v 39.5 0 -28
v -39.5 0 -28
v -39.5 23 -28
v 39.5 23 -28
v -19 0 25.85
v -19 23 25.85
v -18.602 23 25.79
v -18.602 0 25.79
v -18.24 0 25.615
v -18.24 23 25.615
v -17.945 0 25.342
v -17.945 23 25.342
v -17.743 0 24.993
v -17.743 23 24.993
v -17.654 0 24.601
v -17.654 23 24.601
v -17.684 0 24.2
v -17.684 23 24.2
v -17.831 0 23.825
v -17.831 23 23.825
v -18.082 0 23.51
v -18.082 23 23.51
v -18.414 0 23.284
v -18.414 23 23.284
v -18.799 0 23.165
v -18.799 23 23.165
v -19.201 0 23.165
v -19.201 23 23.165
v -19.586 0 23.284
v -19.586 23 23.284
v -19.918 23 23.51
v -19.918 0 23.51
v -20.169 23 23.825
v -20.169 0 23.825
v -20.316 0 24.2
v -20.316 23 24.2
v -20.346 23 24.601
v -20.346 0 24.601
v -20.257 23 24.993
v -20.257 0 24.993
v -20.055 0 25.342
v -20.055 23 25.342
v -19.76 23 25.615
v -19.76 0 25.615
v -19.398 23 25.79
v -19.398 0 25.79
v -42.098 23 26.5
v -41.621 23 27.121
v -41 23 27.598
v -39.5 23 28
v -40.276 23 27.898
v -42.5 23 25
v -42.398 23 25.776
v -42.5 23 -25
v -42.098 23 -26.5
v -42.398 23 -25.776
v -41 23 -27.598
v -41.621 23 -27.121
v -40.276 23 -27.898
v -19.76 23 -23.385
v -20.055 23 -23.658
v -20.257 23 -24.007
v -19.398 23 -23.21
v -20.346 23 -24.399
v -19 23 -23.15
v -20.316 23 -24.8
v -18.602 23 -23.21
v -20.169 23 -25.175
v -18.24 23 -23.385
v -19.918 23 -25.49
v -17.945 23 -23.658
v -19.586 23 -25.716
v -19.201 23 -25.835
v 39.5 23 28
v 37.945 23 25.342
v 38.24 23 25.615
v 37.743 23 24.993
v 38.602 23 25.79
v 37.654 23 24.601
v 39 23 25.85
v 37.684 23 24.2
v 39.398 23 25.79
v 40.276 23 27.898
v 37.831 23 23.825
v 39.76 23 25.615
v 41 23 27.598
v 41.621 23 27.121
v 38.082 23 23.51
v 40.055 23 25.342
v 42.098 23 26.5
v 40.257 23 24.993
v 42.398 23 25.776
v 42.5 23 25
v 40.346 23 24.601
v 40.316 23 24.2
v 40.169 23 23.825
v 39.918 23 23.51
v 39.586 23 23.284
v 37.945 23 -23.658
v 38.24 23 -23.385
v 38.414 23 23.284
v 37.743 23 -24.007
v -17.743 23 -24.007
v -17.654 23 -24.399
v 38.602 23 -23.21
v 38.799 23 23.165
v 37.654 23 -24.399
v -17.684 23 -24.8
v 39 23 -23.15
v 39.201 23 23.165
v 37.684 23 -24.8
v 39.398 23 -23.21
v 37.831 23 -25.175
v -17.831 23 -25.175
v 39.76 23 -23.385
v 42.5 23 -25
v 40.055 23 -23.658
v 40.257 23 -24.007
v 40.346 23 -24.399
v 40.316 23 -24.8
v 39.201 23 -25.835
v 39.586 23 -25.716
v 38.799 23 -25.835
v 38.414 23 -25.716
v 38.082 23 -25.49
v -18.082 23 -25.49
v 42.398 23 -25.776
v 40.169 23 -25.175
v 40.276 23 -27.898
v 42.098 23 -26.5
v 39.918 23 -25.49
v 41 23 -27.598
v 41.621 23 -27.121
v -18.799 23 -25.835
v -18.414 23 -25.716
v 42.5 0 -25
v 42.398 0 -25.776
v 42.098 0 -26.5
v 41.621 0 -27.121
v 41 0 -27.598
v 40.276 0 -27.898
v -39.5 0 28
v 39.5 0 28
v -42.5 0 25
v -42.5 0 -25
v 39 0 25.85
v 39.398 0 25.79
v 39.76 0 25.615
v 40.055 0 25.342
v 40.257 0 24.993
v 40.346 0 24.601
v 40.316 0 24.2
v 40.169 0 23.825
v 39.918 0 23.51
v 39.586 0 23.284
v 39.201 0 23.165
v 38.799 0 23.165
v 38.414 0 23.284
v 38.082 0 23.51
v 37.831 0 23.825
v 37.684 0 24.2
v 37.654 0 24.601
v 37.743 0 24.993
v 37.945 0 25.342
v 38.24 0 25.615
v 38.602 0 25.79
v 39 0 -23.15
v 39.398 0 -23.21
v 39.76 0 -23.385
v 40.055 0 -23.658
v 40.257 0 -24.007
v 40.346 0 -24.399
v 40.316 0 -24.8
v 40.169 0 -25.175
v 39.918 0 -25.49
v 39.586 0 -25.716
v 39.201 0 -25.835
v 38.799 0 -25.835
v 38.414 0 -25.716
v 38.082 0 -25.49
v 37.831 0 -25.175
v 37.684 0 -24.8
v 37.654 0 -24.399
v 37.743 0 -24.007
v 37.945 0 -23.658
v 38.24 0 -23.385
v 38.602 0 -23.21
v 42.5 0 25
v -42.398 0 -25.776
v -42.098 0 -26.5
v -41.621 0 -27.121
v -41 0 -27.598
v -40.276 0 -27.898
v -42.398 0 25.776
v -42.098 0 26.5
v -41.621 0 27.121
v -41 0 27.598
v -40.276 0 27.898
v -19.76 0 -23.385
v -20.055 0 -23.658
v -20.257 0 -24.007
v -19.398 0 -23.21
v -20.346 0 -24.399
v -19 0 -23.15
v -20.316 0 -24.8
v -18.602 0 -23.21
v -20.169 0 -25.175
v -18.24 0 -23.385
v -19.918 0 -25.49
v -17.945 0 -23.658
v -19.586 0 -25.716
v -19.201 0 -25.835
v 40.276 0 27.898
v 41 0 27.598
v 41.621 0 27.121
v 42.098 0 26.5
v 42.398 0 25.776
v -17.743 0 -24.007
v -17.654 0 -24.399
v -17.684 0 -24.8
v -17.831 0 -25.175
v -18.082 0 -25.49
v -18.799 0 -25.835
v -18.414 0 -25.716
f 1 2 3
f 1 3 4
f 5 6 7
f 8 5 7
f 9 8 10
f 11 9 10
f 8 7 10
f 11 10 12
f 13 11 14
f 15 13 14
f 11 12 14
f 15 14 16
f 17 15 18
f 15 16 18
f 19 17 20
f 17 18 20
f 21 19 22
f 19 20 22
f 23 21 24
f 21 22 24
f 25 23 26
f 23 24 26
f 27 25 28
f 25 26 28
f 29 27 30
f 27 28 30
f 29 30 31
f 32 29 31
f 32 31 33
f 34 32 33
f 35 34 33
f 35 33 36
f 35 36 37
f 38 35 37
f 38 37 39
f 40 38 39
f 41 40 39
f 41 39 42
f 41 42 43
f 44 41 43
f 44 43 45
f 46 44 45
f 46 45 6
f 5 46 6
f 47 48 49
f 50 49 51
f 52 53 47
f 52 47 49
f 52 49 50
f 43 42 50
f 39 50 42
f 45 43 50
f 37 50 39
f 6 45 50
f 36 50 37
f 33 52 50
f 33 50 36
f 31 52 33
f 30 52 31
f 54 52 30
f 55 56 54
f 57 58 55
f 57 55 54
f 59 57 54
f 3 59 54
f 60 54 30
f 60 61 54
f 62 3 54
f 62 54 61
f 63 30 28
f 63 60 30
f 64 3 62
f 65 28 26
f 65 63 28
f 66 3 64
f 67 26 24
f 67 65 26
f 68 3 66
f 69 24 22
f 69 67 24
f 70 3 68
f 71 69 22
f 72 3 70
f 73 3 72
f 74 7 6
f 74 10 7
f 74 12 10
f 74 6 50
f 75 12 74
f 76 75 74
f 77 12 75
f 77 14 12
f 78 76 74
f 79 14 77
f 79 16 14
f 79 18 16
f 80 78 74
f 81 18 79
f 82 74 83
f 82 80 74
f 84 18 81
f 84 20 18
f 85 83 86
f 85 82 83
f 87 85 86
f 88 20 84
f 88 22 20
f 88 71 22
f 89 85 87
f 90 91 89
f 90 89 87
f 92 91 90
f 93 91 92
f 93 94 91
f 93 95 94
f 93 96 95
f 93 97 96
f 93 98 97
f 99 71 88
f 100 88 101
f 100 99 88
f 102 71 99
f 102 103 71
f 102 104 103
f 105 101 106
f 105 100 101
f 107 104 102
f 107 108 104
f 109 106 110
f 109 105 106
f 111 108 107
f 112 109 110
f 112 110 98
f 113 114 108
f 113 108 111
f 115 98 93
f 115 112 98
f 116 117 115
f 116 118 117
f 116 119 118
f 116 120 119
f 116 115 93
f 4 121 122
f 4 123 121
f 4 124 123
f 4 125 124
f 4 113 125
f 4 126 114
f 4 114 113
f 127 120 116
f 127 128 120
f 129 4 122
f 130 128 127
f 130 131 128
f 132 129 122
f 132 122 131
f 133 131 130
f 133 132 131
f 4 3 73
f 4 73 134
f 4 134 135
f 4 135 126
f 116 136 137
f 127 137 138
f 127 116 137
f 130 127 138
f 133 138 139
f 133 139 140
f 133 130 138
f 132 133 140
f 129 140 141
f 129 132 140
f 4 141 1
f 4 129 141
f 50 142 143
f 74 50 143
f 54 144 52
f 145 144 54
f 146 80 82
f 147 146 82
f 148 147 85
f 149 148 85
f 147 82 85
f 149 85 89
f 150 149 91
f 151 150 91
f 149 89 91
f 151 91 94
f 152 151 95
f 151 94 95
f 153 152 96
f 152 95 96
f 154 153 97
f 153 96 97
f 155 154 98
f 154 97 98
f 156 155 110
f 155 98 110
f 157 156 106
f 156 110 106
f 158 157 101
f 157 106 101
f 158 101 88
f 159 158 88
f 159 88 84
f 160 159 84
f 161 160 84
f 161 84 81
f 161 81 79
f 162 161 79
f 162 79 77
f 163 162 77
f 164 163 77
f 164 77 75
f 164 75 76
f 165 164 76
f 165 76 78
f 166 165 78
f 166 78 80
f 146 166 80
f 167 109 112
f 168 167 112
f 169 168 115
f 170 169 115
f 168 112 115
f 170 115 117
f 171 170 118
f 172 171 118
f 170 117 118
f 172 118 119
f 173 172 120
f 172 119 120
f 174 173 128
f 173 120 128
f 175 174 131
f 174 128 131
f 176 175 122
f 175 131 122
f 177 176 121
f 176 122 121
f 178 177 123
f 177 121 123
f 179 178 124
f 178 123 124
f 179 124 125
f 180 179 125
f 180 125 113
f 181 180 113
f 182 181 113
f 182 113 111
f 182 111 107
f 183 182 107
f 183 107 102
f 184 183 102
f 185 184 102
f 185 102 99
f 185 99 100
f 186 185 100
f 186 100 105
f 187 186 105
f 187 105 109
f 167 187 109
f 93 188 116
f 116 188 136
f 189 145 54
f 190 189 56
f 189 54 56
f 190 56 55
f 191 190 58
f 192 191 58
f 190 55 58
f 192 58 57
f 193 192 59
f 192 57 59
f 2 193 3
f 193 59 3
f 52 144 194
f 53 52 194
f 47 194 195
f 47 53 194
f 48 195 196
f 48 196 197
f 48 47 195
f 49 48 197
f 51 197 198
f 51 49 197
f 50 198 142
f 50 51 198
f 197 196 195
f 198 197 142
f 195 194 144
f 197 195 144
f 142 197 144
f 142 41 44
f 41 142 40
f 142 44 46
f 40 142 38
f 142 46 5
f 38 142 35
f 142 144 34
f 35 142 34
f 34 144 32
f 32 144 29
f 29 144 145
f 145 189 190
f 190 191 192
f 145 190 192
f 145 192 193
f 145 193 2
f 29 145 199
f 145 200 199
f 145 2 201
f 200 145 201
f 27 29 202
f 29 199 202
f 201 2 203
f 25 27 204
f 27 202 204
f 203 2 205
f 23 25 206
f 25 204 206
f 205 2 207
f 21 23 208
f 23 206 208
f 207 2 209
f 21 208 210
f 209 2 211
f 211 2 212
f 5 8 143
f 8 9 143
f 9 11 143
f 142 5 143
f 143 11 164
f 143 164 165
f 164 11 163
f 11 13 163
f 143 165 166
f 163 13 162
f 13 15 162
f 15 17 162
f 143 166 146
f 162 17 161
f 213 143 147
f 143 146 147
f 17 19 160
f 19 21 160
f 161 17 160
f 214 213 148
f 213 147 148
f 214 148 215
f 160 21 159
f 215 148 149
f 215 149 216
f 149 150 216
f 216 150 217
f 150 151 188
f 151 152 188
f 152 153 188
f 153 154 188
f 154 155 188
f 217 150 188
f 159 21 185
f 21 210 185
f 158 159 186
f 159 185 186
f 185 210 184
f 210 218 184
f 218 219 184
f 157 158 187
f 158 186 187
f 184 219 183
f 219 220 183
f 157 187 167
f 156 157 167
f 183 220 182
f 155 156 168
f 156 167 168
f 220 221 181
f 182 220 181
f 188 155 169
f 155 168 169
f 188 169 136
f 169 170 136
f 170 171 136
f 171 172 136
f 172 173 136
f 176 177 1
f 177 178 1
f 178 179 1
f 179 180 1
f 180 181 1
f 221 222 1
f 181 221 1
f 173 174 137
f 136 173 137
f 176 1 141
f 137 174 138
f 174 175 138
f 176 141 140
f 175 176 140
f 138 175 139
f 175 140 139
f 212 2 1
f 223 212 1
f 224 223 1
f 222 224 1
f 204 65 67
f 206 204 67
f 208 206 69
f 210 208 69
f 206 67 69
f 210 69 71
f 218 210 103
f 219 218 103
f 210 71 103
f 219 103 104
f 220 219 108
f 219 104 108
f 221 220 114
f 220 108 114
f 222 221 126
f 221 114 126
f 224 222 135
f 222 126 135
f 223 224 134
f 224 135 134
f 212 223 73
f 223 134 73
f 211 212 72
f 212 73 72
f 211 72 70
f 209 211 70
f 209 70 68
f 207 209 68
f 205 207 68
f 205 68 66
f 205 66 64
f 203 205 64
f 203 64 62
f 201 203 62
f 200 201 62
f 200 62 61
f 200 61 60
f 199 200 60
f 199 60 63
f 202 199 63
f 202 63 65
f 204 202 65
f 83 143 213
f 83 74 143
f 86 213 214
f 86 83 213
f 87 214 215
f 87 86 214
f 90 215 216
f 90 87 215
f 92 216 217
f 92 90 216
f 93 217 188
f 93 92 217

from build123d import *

# Parameters (mm, degrees)
CROQUIS1_W              = 85
CROQUIS1_H              = 56
SALIENTE_EXTRUIR1_DEPTH = 23
REDONDEO1_R             = 3
CROQUIS2_R              = 1.35
CORTAR_EXTRUIR1_DEPTH   = 56.850246195


with BuildPart() as part:
    # Croquis1 → Saliente-Extruir1 (new body)
    with BuildSketch(Plane(origin=(0, 0, 0), x_dir=(1, 0, 0), z_dir=(0, 1, 0))):
        Rectangle(CROQUIS1_W, CROQUIS1_H)
    extrude(amount=SALIENTE_EXTRUIR1_DEPTH)

    # Redondeo1
    redondeo1_edges = [part.edges().sort_by_distance(p)[0] for p in [
        (-42.5, 11.5, -28),
        (42.5, 11.5, -28),
        (42.5, 11.5, 28),
        (-42.5, 11.5, 28),
    ]]
    fillet(redondeo1_edges, radius=REDONDEO1_R)

    # Croquis2 → Cortar-Extruir1 (cut, through all)
    with BuildSketch(Plane(origin=(0, 23, 0), x_dir=(1, 0, 0), z_dir=(0, 1, 0))):
        with Locations(Location((-19, 24.5, 0), (0, 0, 270))):
            Circle(CROQUIS2_R)
        with Locations(Location((39, 24.5, 0), (0, 0, 270))):
            Circle(CROQUIS2_R)
        with Locations(Location((39, -24.5, 0), (0, 0, 270))):
            Circle(CROQUIS2_R)
        with Locations(Location((-19, -24.5, 0), (0, 0, 270))):
            Circle(CROQUIS2_R)
    extrude(amount=-CORTAR_EXTRUIR1_DEPTH, mode=Mode.SUBTRACT)


solid = part.part
